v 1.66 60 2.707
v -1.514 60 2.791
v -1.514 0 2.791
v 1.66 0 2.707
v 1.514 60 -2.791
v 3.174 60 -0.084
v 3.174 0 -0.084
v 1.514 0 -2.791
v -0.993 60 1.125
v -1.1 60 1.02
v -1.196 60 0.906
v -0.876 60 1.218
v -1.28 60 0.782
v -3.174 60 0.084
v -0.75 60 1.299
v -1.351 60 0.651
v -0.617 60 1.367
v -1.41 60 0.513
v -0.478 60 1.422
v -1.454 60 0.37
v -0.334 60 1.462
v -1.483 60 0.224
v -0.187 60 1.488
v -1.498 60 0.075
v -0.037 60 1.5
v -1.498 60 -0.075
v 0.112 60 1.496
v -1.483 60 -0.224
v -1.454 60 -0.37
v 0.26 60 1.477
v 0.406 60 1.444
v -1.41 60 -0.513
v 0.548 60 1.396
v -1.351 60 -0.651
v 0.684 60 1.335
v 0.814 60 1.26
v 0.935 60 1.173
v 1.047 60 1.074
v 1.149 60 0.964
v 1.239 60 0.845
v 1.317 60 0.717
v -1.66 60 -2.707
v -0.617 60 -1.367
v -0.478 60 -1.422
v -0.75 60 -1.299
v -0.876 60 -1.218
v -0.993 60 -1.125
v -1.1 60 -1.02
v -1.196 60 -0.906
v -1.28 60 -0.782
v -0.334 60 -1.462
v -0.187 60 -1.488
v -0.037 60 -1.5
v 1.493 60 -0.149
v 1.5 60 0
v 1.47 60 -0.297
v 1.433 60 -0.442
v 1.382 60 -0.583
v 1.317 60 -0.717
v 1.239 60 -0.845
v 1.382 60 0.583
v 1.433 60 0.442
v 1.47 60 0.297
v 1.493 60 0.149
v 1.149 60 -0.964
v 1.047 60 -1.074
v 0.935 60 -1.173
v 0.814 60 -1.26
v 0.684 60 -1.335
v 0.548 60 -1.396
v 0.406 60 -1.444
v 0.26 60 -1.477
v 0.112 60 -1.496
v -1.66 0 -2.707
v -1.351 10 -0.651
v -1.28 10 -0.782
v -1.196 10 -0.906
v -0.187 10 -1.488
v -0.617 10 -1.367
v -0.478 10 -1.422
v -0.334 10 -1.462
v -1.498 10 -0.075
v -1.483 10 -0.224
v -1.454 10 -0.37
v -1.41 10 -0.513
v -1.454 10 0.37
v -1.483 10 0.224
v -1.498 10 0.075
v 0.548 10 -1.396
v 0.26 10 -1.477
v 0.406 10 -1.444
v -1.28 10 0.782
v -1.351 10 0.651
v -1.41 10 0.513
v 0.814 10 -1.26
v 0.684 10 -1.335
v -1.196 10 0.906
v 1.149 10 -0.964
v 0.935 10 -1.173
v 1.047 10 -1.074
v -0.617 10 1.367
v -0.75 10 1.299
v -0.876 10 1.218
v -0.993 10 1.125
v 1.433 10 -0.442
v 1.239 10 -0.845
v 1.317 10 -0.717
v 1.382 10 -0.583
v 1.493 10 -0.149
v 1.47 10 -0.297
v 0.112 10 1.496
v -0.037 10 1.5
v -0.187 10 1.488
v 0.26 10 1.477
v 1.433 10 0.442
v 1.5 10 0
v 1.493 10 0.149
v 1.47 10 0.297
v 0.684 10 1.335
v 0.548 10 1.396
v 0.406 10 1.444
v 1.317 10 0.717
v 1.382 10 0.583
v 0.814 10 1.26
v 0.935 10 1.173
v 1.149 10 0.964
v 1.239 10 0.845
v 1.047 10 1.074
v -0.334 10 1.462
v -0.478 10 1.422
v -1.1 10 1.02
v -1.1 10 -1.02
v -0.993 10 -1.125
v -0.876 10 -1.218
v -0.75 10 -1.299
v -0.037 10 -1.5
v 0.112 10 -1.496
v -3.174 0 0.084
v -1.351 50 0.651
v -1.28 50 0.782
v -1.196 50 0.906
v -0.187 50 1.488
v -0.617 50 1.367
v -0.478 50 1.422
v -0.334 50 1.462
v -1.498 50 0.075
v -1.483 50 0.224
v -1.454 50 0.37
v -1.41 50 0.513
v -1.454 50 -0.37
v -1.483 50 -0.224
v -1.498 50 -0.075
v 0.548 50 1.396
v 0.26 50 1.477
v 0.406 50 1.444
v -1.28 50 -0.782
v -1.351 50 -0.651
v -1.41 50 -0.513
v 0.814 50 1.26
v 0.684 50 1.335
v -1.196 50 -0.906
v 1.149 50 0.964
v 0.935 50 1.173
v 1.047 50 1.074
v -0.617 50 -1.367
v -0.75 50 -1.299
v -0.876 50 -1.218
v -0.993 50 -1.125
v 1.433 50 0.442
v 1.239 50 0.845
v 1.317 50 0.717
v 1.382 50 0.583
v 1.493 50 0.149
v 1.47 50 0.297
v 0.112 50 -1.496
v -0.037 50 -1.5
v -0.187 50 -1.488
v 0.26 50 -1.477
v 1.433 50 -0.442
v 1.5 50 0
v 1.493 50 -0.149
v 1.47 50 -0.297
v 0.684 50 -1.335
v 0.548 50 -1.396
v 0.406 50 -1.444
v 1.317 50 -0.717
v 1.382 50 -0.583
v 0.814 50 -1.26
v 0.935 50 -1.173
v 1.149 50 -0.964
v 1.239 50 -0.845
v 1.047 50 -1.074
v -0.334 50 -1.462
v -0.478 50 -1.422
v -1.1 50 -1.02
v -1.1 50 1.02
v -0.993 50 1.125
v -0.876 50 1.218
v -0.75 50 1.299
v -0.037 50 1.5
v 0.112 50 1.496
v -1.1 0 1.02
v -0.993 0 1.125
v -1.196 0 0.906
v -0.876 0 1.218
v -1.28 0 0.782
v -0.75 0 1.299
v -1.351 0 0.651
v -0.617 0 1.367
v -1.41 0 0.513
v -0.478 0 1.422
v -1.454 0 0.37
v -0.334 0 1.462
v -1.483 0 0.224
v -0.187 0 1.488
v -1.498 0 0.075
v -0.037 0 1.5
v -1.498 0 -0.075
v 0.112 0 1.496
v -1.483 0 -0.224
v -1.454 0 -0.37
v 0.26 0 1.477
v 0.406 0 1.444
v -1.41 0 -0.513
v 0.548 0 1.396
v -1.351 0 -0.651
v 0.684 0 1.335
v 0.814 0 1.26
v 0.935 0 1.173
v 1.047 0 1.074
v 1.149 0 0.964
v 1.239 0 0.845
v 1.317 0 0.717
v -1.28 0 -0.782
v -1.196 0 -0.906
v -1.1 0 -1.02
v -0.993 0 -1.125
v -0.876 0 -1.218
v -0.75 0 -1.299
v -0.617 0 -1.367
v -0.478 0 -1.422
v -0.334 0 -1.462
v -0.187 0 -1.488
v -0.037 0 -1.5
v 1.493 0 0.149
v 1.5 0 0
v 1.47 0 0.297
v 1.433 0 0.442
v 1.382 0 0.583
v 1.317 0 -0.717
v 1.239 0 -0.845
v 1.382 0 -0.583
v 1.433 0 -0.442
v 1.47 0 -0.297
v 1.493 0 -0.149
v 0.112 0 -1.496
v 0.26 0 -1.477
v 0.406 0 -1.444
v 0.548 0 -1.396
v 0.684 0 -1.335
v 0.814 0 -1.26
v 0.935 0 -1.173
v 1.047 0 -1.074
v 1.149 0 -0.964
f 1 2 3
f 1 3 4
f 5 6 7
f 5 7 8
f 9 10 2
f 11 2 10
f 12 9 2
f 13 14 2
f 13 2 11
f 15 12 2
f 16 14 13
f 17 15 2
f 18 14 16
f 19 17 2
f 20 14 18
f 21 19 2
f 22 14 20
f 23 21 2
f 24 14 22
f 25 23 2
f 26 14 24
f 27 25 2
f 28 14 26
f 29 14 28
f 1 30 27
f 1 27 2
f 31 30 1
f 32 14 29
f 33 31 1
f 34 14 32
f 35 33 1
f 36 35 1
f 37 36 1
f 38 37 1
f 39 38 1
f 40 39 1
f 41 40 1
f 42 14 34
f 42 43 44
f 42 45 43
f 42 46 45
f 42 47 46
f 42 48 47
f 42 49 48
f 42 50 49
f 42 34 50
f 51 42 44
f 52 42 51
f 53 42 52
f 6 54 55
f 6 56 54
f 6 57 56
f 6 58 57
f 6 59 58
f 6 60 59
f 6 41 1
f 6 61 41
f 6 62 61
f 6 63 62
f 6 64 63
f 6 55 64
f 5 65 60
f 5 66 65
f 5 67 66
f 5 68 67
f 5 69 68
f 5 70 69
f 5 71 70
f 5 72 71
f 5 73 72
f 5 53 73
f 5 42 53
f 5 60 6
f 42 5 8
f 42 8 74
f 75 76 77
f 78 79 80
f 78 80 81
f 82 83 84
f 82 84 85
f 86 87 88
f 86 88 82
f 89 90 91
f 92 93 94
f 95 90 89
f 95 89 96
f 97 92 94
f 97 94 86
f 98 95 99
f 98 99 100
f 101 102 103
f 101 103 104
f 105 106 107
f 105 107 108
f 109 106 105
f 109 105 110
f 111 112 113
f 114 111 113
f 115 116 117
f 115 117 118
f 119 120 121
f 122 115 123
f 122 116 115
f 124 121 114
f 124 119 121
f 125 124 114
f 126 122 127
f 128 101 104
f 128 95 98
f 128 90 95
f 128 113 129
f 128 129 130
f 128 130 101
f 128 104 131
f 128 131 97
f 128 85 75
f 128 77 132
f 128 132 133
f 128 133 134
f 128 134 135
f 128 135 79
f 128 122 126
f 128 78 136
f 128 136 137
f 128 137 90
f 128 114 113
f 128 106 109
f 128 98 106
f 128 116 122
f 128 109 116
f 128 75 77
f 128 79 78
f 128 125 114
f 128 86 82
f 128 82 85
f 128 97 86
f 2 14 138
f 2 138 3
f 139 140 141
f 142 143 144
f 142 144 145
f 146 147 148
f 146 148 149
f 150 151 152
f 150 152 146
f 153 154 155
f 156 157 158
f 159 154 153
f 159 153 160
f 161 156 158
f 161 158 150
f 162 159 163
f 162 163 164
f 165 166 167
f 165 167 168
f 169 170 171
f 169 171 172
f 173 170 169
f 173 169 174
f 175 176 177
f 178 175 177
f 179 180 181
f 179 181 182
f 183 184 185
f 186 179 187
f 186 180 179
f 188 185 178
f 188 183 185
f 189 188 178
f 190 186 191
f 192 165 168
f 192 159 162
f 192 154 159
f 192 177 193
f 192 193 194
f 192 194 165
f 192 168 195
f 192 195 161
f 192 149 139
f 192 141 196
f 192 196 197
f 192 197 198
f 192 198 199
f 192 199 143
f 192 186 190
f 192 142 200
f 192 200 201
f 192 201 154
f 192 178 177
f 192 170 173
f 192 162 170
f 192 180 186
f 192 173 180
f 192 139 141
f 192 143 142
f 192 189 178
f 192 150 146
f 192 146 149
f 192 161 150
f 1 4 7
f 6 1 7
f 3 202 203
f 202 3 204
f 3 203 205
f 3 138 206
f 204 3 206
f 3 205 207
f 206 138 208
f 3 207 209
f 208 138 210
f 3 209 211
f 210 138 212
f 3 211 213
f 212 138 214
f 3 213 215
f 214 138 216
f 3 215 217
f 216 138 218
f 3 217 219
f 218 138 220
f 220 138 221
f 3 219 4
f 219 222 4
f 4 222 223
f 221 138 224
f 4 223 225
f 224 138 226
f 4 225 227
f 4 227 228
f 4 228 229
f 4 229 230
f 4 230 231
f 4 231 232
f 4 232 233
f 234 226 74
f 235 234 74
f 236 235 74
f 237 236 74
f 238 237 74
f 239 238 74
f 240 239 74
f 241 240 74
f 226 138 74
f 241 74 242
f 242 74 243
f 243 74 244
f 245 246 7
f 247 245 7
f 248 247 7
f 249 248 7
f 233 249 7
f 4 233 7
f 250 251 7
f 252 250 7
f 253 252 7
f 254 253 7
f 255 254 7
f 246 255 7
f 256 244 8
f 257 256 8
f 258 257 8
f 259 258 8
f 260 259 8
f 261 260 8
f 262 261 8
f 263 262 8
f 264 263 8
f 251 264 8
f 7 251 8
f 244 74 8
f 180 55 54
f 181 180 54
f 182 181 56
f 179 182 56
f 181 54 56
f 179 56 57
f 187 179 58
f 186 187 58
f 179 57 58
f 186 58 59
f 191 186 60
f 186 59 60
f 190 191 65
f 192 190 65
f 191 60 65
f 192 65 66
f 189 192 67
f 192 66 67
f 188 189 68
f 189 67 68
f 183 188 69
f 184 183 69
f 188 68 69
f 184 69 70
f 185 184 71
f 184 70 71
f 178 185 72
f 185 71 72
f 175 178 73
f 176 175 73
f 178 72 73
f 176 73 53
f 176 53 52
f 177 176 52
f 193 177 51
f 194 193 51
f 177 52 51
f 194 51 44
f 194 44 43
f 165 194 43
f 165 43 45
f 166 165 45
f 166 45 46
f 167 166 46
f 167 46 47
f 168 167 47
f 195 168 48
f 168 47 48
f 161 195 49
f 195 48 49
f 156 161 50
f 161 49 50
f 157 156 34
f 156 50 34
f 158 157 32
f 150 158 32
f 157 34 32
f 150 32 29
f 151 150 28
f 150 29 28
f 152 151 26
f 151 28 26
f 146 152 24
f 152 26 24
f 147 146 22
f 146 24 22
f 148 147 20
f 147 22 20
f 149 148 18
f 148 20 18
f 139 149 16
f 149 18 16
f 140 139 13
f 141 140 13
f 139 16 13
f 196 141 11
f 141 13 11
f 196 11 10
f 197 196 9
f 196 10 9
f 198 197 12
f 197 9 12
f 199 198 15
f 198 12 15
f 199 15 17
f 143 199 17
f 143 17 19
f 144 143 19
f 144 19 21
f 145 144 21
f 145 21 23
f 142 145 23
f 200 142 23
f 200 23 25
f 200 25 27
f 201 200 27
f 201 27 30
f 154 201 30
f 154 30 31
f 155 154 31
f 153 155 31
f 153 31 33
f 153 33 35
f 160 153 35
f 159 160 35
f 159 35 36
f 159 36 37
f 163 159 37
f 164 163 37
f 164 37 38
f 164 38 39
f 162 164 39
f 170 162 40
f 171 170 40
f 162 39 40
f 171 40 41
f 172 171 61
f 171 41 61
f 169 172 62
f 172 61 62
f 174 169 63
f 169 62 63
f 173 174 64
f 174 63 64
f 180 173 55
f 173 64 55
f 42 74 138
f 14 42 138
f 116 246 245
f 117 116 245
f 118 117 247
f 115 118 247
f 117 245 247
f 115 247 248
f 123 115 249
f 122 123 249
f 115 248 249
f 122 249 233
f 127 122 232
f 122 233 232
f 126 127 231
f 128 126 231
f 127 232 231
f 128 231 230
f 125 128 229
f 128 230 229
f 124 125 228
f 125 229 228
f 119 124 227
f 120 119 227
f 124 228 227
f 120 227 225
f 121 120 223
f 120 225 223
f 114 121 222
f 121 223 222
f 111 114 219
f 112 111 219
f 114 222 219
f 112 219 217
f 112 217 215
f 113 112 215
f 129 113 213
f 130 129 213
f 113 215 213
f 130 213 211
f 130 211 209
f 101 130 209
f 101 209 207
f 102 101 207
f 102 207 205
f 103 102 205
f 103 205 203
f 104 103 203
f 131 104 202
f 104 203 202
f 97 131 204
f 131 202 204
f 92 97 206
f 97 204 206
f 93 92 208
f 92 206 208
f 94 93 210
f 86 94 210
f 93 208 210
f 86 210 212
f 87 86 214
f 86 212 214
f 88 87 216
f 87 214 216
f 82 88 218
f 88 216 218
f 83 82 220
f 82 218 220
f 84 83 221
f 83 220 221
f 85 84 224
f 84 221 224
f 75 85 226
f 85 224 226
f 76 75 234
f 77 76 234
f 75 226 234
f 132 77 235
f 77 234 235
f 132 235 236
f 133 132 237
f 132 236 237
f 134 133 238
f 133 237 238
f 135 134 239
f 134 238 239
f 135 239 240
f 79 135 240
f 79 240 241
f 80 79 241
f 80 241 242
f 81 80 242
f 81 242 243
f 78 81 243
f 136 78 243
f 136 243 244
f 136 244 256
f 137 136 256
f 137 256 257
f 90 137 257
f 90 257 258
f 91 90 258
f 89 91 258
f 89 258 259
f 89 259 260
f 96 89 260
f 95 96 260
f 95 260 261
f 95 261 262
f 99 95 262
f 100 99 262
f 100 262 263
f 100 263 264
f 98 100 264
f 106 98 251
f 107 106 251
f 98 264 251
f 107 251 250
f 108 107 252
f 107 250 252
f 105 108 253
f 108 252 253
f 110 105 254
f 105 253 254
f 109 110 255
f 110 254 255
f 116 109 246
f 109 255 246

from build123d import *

# Parameters (mm, degrees)
EXTRUDE_1_DEPTH     = 60
SKETCH_2_R          = 1.5
CUT_EXTRUDE_1_DEPTH = 10
SKETCH_3_R          = 1.5
CUT_EXTRUDE_2_DEPTH = 10


with BuildPart() as part:
    # Эскиз1 → Бобышка-Вытянуть1 (new body)
    with BuildSketch(Plane(origin=(0, 0, 0), x_dir=(1, 0, 0), z_dir=(0, 1, 0))):
        Polygon((-1.514417704, -2.79103428), (1.659897738, -2.707041343), (3.174315441, 0.083992937), (1.514417704, 2.79103428), (-1.659897738, 2.707041343), (-3.174315441, -0.083992937), align=None)
    extrude(amount=EXTRUDE_1_DEPTH)

    # Эскиз2 → Вырез-Вытянуть1 (cut)
    with BuildSketch(Plane(origin=(0, 60, 0), x_dir=(1, 0, 0), z_dir=(0, 1, 0))):
        Circle(SKETCH_2_R)
    extrude(amount=-CUT_EXTRUDE_1_DEPTH, mode=Mode.SUBTRACT)

    # Эскиз3 → Вырез-Вытянуть2 (cut)
    with BuildSketch(Plane.XZ):
        Circle(SKETCH_3_R)
    extrude(amount=-CUT_EXTRUDE_2_DEPTH, mode=Mode.SUBTRACT)


solid = part.part
